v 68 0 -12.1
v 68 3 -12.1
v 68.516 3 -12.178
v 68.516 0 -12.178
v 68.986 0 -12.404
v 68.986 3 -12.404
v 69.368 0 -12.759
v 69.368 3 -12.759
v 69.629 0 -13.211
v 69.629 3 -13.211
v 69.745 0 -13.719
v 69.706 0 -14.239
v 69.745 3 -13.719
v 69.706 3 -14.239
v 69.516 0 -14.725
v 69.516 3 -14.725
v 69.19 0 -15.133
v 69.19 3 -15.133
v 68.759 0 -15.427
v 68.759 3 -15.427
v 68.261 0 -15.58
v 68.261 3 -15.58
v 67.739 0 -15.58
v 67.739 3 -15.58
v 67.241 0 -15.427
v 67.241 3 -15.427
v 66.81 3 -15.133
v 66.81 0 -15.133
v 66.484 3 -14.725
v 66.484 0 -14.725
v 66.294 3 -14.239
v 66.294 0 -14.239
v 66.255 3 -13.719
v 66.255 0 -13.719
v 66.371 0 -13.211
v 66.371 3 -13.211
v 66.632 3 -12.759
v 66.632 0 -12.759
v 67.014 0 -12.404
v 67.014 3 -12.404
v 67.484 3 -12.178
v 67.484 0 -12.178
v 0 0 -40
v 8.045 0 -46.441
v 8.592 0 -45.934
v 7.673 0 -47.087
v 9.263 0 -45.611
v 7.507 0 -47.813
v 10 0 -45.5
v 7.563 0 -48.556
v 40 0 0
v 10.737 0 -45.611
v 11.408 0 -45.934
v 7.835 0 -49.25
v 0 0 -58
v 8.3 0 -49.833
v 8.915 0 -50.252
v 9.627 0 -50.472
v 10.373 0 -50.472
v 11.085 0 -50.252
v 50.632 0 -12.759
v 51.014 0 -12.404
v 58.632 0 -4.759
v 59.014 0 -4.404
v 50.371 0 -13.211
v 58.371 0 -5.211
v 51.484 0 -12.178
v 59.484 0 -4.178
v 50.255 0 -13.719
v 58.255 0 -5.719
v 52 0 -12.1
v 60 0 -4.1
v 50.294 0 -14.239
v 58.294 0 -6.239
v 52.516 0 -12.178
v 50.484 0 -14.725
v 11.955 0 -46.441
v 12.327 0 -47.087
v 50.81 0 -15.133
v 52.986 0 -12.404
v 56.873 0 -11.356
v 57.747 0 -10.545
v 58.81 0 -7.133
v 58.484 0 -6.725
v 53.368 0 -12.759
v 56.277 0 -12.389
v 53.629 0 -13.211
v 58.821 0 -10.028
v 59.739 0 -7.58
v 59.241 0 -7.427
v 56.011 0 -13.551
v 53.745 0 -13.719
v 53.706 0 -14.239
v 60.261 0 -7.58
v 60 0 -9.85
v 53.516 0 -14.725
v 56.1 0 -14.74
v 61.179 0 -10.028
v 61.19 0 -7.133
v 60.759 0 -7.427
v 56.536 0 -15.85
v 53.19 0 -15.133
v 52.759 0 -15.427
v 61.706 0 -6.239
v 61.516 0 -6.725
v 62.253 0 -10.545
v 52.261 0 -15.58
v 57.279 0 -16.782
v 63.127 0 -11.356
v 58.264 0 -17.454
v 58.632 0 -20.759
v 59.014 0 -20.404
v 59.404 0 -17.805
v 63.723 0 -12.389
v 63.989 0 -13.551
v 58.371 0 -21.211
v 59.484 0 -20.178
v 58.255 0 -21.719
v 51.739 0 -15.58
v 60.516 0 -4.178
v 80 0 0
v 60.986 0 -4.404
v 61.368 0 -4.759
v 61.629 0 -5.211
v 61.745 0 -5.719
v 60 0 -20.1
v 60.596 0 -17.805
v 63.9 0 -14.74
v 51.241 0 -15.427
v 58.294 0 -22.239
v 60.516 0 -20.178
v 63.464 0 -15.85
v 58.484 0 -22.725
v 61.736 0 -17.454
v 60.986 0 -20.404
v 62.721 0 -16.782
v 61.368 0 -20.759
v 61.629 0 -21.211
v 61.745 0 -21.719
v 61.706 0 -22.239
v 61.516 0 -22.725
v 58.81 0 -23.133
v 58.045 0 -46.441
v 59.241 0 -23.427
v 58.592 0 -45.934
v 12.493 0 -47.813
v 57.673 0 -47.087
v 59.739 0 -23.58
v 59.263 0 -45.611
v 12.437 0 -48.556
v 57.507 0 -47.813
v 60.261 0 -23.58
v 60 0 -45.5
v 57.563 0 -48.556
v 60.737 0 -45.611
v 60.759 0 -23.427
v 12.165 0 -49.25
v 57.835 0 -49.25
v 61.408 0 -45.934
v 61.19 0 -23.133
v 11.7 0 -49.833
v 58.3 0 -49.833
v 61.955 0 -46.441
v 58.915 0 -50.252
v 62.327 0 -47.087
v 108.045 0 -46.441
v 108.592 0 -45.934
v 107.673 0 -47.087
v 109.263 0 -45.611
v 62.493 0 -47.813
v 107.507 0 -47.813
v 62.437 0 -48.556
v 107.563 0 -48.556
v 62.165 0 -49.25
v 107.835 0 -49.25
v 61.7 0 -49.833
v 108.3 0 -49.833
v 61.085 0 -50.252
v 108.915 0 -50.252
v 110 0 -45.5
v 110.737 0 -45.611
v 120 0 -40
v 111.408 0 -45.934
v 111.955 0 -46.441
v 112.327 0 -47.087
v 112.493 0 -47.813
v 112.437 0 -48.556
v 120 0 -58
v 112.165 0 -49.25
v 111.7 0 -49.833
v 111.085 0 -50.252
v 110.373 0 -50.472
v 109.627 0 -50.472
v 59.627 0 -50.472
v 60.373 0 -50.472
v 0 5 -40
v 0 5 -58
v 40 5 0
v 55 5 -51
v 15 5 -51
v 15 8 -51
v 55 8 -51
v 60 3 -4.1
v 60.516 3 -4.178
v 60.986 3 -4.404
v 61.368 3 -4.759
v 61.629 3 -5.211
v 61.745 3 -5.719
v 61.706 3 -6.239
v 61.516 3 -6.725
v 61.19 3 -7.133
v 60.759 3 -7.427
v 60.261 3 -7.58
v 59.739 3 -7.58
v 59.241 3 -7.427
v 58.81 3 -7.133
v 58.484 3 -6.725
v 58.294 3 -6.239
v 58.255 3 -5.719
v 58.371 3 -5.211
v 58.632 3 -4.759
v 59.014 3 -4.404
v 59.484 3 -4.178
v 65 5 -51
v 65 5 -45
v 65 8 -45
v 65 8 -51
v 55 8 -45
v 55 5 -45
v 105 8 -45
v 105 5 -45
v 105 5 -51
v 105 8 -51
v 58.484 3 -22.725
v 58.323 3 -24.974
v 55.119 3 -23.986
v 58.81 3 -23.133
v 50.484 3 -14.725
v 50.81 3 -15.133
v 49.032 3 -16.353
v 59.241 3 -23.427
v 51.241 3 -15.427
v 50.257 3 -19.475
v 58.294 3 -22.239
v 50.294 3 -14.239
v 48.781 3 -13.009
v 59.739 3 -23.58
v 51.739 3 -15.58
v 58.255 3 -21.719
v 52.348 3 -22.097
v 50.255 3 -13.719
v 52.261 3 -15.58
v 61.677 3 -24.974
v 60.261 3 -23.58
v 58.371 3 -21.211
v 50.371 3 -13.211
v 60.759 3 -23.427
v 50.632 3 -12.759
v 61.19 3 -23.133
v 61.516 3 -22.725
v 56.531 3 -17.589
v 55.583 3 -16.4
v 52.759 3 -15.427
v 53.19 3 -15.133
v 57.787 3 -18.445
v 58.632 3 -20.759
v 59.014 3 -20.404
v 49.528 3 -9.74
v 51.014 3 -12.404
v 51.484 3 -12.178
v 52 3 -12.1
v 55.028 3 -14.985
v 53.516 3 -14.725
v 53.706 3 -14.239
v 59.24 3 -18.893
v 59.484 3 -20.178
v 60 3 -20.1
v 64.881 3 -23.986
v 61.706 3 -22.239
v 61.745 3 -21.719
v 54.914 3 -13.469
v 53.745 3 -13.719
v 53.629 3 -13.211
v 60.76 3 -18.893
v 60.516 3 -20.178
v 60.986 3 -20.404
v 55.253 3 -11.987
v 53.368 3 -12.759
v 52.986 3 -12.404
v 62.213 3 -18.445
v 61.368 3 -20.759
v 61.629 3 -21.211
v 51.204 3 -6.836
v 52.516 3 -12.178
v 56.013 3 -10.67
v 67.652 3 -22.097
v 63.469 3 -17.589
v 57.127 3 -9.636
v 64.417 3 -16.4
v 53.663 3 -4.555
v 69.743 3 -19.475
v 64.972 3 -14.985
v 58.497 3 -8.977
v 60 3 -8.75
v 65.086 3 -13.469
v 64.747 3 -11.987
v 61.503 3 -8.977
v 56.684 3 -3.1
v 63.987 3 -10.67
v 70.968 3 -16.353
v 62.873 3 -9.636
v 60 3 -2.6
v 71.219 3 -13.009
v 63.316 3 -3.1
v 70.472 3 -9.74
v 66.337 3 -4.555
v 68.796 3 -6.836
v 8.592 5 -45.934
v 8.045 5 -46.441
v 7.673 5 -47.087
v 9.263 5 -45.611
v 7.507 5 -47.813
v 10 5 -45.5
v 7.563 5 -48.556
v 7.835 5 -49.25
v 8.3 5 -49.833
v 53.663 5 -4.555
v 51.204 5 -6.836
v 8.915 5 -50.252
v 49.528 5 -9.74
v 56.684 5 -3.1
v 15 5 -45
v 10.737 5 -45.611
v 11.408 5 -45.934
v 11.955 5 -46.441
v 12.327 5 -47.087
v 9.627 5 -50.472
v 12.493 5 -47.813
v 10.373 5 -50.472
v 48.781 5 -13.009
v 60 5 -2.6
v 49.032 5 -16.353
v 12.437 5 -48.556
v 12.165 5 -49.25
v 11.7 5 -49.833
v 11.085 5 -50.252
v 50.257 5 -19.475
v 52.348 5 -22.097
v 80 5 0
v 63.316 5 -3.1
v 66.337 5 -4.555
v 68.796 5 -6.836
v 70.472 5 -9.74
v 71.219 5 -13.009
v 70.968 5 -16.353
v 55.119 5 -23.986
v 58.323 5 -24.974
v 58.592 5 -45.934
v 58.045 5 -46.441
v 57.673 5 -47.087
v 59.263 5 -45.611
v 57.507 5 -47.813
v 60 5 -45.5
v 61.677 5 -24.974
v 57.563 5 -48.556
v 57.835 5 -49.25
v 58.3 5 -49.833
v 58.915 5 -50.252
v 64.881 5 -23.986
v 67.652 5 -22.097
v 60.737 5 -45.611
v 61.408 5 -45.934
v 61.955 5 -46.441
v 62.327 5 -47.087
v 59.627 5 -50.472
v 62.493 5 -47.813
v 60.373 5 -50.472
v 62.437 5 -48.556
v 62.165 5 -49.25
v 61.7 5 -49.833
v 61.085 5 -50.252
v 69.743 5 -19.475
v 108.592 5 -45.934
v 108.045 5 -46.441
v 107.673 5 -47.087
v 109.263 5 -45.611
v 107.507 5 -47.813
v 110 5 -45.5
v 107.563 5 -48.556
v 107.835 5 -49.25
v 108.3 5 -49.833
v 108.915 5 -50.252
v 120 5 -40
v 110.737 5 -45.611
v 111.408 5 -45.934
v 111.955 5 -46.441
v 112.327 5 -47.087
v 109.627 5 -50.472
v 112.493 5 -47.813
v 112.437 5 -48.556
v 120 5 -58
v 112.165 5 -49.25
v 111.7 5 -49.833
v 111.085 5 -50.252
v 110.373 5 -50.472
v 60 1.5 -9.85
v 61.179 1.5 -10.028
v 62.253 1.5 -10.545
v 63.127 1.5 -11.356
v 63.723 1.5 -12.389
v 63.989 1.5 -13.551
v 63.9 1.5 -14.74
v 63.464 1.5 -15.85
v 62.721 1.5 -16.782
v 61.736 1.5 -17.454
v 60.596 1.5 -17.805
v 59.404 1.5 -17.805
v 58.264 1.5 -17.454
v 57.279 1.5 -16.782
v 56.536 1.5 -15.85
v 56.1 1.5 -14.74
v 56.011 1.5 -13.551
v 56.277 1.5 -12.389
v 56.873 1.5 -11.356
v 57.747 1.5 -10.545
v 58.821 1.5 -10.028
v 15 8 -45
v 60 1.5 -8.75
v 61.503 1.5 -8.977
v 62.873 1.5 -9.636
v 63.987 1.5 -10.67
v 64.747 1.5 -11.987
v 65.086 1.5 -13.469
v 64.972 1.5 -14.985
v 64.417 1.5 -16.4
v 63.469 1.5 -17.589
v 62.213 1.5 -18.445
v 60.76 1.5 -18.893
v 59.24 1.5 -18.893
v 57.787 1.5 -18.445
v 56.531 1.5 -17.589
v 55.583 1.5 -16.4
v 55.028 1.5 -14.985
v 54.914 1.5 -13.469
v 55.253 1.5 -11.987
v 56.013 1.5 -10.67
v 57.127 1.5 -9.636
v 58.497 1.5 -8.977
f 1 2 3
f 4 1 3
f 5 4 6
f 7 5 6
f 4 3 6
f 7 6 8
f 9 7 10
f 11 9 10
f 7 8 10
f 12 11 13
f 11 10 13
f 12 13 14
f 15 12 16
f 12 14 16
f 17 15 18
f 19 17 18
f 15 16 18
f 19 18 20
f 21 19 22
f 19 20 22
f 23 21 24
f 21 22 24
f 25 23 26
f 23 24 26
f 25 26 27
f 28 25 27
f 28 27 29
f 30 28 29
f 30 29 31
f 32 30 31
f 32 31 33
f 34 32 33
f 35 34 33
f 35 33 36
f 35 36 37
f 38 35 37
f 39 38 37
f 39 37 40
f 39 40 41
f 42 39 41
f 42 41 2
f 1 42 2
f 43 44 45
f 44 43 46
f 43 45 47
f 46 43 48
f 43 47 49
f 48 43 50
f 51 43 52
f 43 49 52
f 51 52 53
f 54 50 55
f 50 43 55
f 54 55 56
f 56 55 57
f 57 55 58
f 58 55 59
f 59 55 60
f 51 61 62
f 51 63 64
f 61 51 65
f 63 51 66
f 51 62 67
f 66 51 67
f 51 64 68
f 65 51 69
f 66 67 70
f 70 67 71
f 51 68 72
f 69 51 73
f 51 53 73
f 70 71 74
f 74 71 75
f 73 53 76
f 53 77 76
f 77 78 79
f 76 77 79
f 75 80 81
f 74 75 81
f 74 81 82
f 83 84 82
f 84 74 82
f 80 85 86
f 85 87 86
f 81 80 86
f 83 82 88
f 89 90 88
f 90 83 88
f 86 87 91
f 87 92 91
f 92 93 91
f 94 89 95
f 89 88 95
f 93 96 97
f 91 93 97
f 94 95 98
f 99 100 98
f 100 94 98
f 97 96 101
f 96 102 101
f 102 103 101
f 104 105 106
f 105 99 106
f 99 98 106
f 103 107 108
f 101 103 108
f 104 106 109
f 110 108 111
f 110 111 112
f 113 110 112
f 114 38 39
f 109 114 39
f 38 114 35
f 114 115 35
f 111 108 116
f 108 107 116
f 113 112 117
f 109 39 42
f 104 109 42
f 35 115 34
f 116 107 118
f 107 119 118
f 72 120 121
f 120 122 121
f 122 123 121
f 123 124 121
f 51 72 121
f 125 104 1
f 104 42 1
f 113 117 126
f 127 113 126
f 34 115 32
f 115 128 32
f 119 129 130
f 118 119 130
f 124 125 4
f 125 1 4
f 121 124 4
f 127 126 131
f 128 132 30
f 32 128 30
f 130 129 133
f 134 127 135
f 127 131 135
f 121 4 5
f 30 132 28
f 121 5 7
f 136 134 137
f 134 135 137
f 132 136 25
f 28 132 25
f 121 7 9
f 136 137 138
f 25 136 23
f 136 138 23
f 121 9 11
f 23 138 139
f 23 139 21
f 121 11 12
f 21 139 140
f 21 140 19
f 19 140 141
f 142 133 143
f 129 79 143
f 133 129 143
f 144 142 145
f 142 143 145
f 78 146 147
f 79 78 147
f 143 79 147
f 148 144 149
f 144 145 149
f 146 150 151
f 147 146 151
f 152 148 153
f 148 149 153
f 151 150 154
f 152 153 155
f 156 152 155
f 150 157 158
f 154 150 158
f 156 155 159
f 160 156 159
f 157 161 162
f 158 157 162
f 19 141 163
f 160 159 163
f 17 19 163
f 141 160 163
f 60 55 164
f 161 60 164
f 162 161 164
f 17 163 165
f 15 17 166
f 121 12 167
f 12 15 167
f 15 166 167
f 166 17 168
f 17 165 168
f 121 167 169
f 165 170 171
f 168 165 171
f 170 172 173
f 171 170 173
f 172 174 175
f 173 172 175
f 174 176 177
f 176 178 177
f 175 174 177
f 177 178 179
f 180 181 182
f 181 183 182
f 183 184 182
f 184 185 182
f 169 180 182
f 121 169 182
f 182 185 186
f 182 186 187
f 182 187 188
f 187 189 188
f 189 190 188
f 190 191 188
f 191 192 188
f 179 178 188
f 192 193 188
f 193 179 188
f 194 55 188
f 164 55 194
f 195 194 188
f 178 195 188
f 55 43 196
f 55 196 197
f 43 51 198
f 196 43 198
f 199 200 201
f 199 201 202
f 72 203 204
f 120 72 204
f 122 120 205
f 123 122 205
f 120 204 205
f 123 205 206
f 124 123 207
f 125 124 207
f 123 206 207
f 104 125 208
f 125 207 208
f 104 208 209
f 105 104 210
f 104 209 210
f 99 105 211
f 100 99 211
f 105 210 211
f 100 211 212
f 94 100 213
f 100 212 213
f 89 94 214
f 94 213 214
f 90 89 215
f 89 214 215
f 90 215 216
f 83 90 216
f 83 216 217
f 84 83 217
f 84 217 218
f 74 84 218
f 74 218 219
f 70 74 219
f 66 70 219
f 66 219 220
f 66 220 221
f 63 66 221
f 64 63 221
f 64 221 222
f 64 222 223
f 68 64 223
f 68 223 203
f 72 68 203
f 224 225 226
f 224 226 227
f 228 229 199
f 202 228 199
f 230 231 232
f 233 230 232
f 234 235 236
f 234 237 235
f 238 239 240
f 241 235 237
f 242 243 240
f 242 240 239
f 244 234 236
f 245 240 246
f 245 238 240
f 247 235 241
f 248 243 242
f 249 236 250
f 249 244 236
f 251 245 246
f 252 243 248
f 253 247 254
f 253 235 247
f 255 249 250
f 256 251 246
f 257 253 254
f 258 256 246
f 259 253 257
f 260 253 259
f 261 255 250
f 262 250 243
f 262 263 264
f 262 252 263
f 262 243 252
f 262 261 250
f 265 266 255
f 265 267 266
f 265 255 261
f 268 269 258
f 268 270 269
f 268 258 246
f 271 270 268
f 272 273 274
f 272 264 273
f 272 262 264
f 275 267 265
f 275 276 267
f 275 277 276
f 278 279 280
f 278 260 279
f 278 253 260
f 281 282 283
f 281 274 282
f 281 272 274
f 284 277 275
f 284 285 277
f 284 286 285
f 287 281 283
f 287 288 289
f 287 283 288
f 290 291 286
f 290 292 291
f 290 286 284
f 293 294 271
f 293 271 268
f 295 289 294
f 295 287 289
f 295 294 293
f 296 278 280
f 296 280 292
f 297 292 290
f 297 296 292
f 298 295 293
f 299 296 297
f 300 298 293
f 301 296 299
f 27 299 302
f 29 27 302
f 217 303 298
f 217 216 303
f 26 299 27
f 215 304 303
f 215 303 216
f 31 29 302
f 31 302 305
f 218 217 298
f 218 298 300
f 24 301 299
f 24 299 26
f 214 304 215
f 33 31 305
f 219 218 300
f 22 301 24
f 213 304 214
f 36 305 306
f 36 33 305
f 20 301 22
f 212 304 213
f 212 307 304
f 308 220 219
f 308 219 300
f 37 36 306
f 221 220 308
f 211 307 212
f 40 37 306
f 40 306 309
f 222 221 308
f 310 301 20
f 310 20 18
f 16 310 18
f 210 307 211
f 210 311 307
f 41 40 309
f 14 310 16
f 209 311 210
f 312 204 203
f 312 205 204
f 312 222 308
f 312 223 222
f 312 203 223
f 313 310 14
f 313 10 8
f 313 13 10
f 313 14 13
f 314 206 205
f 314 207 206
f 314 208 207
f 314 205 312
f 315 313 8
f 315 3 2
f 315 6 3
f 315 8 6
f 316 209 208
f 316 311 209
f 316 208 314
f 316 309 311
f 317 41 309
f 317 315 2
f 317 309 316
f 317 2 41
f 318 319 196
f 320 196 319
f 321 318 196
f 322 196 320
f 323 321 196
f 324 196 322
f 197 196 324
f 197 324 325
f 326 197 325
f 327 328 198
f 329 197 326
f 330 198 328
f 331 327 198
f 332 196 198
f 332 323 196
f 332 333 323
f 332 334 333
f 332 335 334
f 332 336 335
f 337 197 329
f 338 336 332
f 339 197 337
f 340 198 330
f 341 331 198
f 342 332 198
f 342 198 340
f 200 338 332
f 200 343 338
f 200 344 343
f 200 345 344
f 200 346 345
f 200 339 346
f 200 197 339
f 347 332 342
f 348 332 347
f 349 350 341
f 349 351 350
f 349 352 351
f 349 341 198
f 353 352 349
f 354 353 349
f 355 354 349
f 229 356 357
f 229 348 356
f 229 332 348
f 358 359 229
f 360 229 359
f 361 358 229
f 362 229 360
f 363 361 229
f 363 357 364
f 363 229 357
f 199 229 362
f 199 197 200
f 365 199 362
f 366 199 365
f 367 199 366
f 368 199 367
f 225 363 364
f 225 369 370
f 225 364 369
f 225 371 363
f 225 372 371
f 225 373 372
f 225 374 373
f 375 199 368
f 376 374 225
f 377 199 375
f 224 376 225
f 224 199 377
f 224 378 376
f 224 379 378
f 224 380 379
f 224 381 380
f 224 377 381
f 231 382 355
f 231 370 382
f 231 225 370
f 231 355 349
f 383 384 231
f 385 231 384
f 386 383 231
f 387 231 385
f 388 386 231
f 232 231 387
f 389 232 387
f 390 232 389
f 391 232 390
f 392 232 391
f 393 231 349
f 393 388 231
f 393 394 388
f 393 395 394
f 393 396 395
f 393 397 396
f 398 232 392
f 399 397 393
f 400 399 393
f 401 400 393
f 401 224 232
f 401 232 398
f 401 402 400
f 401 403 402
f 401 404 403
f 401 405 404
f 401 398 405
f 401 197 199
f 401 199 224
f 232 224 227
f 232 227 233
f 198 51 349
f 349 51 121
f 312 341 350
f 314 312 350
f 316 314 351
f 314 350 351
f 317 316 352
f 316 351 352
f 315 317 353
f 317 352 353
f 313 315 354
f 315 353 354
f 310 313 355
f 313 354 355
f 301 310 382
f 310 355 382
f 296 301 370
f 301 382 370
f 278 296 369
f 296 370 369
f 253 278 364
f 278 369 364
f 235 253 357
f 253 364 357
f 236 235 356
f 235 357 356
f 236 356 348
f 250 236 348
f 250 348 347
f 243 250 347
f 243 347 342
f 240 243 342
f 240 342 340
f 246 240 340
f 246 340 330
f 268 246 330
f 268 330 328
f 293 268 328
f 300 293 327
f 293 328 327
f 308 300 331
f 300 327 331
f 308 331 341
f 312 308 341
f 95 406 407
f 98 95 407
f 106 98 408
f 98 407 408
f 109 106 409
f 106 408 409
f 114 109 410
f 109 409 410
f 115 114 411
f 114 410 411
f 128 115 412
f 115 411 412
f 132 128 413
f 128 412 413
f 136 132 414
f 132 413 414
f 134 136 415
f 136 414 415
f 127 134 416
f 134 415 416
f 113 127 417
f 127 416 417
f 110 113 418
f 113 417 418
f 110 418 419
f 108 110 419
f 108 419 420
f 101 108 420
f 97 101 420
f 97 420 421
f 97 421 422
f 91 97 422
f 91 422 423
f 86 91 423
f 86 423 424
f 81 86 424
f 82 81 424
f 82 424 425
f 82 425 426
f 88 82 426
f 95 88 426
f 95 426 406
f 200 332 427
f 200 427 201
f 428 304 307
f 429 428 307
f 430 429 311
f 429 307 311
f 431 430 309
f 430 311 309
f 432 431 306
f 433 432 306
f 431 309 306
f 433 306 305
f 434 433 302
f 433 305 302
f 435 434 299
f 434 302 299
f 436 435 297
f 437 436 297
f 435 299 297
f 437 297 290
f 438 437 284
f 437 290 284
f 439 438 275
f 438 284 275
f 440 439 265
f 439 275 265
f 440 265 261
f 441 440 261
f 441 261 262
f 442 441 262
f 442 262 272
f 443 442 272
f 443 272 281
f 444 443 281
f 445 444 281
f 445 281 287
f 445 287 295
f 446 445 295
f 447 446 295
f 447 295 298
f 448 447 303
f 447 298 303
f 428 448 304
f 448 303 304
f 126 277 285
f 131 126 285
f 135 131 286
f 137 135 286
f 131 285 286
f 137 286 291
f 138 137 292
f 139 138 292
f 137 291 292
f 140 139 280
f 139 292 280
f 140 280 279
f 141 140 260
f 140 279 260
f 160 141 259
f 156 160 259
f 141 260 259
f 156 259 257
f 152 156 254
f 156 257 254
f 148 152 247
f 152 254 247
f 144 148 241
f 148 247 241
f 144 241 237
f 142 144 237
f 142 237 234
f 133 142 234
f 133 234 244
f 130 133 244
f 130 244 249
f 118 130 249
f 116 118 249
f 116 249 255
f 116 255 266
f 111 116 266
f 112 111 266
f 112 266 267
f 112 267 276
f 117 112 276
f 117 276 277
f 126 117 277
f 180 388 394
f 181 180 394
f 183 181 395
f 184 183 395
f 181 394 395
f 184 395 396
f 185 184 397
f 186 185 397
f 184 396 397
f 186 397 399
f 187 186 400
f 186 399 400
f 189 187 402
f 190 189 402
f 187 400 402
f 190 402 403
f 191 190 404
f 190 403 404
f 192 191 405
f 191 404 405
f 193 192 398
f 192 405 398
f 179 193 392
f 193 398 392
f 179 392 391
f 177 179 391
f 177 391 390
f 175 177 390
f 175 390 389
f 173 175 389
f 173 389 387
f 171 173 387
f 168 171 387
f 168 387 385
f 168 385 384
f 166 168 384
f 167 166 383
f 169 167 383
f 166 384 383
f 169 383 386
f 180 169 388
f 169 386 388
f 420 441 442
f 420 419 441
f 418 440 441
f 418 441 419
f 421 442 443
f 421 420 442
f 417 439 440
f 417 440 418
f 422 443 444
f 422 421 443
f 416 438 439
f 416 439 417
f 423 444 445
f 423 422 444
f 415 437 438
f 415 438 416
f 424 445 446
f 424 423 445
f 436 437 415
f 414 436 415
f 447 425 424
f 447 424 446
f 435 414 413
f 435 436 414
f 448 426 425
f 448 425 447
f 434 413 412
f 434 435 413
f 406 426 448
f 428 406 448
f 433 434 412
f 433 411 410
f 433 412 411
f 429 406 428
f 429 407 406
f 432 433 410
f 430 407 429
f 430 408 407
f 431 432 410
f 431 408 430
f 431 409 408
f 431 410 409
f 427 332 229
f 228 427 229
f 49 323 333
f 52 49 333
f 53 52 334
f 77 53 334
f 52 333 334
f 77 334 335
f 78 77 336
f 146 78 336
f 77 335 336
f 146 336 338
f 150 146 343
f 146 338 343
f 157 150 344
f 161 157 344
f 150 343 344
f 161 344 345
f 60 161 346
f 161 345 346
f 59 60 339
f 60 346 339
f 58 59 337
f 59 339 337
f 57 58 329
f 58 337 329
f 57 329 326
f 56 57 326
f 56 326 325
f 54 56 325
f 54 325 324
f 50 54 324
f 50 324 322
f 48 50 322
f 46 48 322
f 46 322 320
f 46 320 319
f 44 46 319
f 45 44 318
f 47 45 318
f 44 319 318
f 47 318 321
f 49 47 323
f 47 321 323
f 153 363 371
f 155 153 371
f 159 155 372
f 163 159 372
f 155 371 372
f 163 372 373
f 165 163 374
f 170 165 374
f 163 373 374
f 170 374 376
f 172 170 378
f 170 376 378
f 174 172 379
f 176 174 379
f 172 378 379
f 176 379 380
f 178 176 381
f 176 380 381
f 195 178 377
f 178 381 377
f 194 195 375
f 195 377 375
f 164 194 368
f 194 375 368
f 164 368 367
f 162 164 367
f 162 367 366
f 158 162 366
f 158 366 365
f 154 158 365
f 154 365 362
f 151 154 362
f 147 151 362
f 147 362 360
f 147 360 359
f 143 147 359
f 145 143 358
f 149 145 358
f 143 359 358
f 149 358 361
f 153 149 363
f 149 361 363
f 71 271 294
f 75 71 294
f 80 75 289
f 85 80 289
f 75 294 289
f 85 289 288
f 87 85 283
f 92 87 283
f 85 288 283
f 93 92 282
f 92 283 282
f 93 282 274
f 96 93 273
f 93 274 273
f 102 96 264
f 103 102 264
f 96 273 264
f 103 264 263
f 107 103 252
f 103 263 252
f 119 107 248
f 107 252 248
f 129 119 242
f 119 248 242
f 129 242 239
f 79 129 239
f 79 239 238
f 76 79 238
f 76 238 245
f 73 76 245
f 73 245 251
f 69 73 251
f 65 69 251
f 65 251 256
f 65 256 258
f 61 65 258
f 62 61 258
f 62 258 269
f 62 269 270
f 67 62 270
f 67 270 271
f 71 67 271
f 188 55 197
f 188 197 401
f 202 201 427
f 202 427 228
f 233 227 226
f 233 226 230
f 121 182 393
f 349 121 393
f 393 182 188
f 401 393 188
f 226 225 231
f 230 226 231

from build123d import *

# Parameters (mm, degrees)
SKETCH1_W           = 120
SKETCH1_H           = 58
BOSS_EXTRUDE5_DEPTH = 5
SKETCH5_R           = 2.5
CUT_EXTRUDE2_DEPTH  = 5
SKETCH6_W           = 40
SKETCH6_H           = 6
BOSS_EXTRUDE6_DEPTH = 3
SKETCH7_R           = 11.25
CUT_EXTRUDE3_DEPTH  = 2
SKETCH8_R           = 4
CUT_EXTRUDE4_DEPTH  = 12
SKETCH9_R           = 5.1
CUT_EXTRUDE5_DEPTH  = 1.5
SKETCH10_R          = 1.75
CUT_EXTRUDE6_DEPTH  = 21.5
CHAMFER1_SIZE       = 40


with BuildPart() as part:
    # Sketch1 → Boss-Extrude5 (new body)
    with BuildSketch(Plane(origin=(0, 0, 0), x_dir=(1, 0, 0), z_dir=(0, 1, 0))):
        with Locations((60, 29)):
            Rectangle(SKETCH1_W, SKETCH1_H)
    extrude(amount=BOSS_EXTRUDE5_DEPTH)

    # Sketch5 → Cut-Extrude2 (cut)
    with BuildSketch(Plane(origin=(0, 5, 0), x_dir=(1, 0, 0), z_dir=(0, 1, 0))):
        with Locations(Location((10, 48, 0), (0, 0, 270))):
            Circle(SKETCH5_R)
        with Locations(Location((60, 48, 0), (0, 0, 270))):
            Circle(SKETCH5_R)
        with Locations(Location((110, 48, 0), (0, 0, 270))):
            Circle(SKETCH5_R)
    extrude(amount=-CUT_EXTRUDE2_DEPTH, mode=Mode.SUBTRACT)

    # Sketch6 → Boss-Extrude6 (add)
    with BuildSketch(Plane(origin=(0, 5, 0), x_dir=(1, 0, 0), z_dir=(0, 1, 0))):
        with Locations((35, 48)):
            Rectangle(SKETCH6_W, SKETCH6_H)
        with Locations((85, 48)):
            Rectangle(SKETCH6_W, SKETCH6_H)
    extrude(amount=BOSS_EXTRUDE6_DEPTH)

    # Sketch7 → Cut-Extrude3 (cut)
    with BuildSketch(Plane(origin=(0, 5, 0), x_dir=(1, 0, 0), z_dir=(0, 1, 0))):
        with Locations(Location((60, 13.85, 0), (0, 0, 270))):
            Circle(SKETCH7_R)
    extrude(amount=-CUT_EXTRUDE3_DEPTH, mode=Mode.SUBTRACT)

    # Sketch8 → Cut-Extrude4 (cut)
    with BuildSketch(Plane(origin=(0, 3, 0), x_dir=(1, 0, 0), z_dir=(0, 1, 0))):
        with Locations(Location((60, 13.85, 0), (0, 0, 270))):
            Circle(SKETCH8_R)
    extrude(amount=-CUT_EXTRUDE4_DEPTH, mode=Mode.SUBTRACT)

    # Sketch9 → Cut-Extrude5 (cut)
    with BuildSketch(Plane(origin=(0, 3, 0), x_dir=(1, 0, 0), z_dir=(0, 1, 0))):
        with Locations(Location((60, 13.85, 0), (0, 0, 270))):
            Circle(SKETCH9_R)
    extrude(amount=-CUT_EXTRUDE5_DEPTH, mode=Mode.SUBTRACT)

    # Sketch10 → Cut-Extrude6 (cut)
    with BuildSketch(Plane(origin=(0, 3, 0), x_dir=(1, 0, 0), z_dir=(0, 1, 0))):
        with Locations(Location((52, 13.85, 0), (0, 0, 270))):
            Circle(SKETCH10_R)
        with Locations(Location((60, 21.85, 0), (0, 0, 270))):
            Circle(SKETCH10_R)
        with Locations(Location((68, 13.85, 0), (0, 0, 270))):
            Circle(SKETCH10_R)
        with Locations(Location((60, 5.85, 0), (0, 0, 270))):
            Circle(SKETCH10_R)
    extrude(amount=-CUT_EXTRUDE6_DEPTH, mode=Mode.SUBTRACT)

    # Chamfer1
    chamfer1_edges = [part.edges().sort_by_distance(p)[0] for p in [
        (120, 2.5, 0),
        (0, 2.5, 0),
    ]]
    chamfer(chamfer1_edges, length=CHAMFER1_SIZE)


solid = part.part
